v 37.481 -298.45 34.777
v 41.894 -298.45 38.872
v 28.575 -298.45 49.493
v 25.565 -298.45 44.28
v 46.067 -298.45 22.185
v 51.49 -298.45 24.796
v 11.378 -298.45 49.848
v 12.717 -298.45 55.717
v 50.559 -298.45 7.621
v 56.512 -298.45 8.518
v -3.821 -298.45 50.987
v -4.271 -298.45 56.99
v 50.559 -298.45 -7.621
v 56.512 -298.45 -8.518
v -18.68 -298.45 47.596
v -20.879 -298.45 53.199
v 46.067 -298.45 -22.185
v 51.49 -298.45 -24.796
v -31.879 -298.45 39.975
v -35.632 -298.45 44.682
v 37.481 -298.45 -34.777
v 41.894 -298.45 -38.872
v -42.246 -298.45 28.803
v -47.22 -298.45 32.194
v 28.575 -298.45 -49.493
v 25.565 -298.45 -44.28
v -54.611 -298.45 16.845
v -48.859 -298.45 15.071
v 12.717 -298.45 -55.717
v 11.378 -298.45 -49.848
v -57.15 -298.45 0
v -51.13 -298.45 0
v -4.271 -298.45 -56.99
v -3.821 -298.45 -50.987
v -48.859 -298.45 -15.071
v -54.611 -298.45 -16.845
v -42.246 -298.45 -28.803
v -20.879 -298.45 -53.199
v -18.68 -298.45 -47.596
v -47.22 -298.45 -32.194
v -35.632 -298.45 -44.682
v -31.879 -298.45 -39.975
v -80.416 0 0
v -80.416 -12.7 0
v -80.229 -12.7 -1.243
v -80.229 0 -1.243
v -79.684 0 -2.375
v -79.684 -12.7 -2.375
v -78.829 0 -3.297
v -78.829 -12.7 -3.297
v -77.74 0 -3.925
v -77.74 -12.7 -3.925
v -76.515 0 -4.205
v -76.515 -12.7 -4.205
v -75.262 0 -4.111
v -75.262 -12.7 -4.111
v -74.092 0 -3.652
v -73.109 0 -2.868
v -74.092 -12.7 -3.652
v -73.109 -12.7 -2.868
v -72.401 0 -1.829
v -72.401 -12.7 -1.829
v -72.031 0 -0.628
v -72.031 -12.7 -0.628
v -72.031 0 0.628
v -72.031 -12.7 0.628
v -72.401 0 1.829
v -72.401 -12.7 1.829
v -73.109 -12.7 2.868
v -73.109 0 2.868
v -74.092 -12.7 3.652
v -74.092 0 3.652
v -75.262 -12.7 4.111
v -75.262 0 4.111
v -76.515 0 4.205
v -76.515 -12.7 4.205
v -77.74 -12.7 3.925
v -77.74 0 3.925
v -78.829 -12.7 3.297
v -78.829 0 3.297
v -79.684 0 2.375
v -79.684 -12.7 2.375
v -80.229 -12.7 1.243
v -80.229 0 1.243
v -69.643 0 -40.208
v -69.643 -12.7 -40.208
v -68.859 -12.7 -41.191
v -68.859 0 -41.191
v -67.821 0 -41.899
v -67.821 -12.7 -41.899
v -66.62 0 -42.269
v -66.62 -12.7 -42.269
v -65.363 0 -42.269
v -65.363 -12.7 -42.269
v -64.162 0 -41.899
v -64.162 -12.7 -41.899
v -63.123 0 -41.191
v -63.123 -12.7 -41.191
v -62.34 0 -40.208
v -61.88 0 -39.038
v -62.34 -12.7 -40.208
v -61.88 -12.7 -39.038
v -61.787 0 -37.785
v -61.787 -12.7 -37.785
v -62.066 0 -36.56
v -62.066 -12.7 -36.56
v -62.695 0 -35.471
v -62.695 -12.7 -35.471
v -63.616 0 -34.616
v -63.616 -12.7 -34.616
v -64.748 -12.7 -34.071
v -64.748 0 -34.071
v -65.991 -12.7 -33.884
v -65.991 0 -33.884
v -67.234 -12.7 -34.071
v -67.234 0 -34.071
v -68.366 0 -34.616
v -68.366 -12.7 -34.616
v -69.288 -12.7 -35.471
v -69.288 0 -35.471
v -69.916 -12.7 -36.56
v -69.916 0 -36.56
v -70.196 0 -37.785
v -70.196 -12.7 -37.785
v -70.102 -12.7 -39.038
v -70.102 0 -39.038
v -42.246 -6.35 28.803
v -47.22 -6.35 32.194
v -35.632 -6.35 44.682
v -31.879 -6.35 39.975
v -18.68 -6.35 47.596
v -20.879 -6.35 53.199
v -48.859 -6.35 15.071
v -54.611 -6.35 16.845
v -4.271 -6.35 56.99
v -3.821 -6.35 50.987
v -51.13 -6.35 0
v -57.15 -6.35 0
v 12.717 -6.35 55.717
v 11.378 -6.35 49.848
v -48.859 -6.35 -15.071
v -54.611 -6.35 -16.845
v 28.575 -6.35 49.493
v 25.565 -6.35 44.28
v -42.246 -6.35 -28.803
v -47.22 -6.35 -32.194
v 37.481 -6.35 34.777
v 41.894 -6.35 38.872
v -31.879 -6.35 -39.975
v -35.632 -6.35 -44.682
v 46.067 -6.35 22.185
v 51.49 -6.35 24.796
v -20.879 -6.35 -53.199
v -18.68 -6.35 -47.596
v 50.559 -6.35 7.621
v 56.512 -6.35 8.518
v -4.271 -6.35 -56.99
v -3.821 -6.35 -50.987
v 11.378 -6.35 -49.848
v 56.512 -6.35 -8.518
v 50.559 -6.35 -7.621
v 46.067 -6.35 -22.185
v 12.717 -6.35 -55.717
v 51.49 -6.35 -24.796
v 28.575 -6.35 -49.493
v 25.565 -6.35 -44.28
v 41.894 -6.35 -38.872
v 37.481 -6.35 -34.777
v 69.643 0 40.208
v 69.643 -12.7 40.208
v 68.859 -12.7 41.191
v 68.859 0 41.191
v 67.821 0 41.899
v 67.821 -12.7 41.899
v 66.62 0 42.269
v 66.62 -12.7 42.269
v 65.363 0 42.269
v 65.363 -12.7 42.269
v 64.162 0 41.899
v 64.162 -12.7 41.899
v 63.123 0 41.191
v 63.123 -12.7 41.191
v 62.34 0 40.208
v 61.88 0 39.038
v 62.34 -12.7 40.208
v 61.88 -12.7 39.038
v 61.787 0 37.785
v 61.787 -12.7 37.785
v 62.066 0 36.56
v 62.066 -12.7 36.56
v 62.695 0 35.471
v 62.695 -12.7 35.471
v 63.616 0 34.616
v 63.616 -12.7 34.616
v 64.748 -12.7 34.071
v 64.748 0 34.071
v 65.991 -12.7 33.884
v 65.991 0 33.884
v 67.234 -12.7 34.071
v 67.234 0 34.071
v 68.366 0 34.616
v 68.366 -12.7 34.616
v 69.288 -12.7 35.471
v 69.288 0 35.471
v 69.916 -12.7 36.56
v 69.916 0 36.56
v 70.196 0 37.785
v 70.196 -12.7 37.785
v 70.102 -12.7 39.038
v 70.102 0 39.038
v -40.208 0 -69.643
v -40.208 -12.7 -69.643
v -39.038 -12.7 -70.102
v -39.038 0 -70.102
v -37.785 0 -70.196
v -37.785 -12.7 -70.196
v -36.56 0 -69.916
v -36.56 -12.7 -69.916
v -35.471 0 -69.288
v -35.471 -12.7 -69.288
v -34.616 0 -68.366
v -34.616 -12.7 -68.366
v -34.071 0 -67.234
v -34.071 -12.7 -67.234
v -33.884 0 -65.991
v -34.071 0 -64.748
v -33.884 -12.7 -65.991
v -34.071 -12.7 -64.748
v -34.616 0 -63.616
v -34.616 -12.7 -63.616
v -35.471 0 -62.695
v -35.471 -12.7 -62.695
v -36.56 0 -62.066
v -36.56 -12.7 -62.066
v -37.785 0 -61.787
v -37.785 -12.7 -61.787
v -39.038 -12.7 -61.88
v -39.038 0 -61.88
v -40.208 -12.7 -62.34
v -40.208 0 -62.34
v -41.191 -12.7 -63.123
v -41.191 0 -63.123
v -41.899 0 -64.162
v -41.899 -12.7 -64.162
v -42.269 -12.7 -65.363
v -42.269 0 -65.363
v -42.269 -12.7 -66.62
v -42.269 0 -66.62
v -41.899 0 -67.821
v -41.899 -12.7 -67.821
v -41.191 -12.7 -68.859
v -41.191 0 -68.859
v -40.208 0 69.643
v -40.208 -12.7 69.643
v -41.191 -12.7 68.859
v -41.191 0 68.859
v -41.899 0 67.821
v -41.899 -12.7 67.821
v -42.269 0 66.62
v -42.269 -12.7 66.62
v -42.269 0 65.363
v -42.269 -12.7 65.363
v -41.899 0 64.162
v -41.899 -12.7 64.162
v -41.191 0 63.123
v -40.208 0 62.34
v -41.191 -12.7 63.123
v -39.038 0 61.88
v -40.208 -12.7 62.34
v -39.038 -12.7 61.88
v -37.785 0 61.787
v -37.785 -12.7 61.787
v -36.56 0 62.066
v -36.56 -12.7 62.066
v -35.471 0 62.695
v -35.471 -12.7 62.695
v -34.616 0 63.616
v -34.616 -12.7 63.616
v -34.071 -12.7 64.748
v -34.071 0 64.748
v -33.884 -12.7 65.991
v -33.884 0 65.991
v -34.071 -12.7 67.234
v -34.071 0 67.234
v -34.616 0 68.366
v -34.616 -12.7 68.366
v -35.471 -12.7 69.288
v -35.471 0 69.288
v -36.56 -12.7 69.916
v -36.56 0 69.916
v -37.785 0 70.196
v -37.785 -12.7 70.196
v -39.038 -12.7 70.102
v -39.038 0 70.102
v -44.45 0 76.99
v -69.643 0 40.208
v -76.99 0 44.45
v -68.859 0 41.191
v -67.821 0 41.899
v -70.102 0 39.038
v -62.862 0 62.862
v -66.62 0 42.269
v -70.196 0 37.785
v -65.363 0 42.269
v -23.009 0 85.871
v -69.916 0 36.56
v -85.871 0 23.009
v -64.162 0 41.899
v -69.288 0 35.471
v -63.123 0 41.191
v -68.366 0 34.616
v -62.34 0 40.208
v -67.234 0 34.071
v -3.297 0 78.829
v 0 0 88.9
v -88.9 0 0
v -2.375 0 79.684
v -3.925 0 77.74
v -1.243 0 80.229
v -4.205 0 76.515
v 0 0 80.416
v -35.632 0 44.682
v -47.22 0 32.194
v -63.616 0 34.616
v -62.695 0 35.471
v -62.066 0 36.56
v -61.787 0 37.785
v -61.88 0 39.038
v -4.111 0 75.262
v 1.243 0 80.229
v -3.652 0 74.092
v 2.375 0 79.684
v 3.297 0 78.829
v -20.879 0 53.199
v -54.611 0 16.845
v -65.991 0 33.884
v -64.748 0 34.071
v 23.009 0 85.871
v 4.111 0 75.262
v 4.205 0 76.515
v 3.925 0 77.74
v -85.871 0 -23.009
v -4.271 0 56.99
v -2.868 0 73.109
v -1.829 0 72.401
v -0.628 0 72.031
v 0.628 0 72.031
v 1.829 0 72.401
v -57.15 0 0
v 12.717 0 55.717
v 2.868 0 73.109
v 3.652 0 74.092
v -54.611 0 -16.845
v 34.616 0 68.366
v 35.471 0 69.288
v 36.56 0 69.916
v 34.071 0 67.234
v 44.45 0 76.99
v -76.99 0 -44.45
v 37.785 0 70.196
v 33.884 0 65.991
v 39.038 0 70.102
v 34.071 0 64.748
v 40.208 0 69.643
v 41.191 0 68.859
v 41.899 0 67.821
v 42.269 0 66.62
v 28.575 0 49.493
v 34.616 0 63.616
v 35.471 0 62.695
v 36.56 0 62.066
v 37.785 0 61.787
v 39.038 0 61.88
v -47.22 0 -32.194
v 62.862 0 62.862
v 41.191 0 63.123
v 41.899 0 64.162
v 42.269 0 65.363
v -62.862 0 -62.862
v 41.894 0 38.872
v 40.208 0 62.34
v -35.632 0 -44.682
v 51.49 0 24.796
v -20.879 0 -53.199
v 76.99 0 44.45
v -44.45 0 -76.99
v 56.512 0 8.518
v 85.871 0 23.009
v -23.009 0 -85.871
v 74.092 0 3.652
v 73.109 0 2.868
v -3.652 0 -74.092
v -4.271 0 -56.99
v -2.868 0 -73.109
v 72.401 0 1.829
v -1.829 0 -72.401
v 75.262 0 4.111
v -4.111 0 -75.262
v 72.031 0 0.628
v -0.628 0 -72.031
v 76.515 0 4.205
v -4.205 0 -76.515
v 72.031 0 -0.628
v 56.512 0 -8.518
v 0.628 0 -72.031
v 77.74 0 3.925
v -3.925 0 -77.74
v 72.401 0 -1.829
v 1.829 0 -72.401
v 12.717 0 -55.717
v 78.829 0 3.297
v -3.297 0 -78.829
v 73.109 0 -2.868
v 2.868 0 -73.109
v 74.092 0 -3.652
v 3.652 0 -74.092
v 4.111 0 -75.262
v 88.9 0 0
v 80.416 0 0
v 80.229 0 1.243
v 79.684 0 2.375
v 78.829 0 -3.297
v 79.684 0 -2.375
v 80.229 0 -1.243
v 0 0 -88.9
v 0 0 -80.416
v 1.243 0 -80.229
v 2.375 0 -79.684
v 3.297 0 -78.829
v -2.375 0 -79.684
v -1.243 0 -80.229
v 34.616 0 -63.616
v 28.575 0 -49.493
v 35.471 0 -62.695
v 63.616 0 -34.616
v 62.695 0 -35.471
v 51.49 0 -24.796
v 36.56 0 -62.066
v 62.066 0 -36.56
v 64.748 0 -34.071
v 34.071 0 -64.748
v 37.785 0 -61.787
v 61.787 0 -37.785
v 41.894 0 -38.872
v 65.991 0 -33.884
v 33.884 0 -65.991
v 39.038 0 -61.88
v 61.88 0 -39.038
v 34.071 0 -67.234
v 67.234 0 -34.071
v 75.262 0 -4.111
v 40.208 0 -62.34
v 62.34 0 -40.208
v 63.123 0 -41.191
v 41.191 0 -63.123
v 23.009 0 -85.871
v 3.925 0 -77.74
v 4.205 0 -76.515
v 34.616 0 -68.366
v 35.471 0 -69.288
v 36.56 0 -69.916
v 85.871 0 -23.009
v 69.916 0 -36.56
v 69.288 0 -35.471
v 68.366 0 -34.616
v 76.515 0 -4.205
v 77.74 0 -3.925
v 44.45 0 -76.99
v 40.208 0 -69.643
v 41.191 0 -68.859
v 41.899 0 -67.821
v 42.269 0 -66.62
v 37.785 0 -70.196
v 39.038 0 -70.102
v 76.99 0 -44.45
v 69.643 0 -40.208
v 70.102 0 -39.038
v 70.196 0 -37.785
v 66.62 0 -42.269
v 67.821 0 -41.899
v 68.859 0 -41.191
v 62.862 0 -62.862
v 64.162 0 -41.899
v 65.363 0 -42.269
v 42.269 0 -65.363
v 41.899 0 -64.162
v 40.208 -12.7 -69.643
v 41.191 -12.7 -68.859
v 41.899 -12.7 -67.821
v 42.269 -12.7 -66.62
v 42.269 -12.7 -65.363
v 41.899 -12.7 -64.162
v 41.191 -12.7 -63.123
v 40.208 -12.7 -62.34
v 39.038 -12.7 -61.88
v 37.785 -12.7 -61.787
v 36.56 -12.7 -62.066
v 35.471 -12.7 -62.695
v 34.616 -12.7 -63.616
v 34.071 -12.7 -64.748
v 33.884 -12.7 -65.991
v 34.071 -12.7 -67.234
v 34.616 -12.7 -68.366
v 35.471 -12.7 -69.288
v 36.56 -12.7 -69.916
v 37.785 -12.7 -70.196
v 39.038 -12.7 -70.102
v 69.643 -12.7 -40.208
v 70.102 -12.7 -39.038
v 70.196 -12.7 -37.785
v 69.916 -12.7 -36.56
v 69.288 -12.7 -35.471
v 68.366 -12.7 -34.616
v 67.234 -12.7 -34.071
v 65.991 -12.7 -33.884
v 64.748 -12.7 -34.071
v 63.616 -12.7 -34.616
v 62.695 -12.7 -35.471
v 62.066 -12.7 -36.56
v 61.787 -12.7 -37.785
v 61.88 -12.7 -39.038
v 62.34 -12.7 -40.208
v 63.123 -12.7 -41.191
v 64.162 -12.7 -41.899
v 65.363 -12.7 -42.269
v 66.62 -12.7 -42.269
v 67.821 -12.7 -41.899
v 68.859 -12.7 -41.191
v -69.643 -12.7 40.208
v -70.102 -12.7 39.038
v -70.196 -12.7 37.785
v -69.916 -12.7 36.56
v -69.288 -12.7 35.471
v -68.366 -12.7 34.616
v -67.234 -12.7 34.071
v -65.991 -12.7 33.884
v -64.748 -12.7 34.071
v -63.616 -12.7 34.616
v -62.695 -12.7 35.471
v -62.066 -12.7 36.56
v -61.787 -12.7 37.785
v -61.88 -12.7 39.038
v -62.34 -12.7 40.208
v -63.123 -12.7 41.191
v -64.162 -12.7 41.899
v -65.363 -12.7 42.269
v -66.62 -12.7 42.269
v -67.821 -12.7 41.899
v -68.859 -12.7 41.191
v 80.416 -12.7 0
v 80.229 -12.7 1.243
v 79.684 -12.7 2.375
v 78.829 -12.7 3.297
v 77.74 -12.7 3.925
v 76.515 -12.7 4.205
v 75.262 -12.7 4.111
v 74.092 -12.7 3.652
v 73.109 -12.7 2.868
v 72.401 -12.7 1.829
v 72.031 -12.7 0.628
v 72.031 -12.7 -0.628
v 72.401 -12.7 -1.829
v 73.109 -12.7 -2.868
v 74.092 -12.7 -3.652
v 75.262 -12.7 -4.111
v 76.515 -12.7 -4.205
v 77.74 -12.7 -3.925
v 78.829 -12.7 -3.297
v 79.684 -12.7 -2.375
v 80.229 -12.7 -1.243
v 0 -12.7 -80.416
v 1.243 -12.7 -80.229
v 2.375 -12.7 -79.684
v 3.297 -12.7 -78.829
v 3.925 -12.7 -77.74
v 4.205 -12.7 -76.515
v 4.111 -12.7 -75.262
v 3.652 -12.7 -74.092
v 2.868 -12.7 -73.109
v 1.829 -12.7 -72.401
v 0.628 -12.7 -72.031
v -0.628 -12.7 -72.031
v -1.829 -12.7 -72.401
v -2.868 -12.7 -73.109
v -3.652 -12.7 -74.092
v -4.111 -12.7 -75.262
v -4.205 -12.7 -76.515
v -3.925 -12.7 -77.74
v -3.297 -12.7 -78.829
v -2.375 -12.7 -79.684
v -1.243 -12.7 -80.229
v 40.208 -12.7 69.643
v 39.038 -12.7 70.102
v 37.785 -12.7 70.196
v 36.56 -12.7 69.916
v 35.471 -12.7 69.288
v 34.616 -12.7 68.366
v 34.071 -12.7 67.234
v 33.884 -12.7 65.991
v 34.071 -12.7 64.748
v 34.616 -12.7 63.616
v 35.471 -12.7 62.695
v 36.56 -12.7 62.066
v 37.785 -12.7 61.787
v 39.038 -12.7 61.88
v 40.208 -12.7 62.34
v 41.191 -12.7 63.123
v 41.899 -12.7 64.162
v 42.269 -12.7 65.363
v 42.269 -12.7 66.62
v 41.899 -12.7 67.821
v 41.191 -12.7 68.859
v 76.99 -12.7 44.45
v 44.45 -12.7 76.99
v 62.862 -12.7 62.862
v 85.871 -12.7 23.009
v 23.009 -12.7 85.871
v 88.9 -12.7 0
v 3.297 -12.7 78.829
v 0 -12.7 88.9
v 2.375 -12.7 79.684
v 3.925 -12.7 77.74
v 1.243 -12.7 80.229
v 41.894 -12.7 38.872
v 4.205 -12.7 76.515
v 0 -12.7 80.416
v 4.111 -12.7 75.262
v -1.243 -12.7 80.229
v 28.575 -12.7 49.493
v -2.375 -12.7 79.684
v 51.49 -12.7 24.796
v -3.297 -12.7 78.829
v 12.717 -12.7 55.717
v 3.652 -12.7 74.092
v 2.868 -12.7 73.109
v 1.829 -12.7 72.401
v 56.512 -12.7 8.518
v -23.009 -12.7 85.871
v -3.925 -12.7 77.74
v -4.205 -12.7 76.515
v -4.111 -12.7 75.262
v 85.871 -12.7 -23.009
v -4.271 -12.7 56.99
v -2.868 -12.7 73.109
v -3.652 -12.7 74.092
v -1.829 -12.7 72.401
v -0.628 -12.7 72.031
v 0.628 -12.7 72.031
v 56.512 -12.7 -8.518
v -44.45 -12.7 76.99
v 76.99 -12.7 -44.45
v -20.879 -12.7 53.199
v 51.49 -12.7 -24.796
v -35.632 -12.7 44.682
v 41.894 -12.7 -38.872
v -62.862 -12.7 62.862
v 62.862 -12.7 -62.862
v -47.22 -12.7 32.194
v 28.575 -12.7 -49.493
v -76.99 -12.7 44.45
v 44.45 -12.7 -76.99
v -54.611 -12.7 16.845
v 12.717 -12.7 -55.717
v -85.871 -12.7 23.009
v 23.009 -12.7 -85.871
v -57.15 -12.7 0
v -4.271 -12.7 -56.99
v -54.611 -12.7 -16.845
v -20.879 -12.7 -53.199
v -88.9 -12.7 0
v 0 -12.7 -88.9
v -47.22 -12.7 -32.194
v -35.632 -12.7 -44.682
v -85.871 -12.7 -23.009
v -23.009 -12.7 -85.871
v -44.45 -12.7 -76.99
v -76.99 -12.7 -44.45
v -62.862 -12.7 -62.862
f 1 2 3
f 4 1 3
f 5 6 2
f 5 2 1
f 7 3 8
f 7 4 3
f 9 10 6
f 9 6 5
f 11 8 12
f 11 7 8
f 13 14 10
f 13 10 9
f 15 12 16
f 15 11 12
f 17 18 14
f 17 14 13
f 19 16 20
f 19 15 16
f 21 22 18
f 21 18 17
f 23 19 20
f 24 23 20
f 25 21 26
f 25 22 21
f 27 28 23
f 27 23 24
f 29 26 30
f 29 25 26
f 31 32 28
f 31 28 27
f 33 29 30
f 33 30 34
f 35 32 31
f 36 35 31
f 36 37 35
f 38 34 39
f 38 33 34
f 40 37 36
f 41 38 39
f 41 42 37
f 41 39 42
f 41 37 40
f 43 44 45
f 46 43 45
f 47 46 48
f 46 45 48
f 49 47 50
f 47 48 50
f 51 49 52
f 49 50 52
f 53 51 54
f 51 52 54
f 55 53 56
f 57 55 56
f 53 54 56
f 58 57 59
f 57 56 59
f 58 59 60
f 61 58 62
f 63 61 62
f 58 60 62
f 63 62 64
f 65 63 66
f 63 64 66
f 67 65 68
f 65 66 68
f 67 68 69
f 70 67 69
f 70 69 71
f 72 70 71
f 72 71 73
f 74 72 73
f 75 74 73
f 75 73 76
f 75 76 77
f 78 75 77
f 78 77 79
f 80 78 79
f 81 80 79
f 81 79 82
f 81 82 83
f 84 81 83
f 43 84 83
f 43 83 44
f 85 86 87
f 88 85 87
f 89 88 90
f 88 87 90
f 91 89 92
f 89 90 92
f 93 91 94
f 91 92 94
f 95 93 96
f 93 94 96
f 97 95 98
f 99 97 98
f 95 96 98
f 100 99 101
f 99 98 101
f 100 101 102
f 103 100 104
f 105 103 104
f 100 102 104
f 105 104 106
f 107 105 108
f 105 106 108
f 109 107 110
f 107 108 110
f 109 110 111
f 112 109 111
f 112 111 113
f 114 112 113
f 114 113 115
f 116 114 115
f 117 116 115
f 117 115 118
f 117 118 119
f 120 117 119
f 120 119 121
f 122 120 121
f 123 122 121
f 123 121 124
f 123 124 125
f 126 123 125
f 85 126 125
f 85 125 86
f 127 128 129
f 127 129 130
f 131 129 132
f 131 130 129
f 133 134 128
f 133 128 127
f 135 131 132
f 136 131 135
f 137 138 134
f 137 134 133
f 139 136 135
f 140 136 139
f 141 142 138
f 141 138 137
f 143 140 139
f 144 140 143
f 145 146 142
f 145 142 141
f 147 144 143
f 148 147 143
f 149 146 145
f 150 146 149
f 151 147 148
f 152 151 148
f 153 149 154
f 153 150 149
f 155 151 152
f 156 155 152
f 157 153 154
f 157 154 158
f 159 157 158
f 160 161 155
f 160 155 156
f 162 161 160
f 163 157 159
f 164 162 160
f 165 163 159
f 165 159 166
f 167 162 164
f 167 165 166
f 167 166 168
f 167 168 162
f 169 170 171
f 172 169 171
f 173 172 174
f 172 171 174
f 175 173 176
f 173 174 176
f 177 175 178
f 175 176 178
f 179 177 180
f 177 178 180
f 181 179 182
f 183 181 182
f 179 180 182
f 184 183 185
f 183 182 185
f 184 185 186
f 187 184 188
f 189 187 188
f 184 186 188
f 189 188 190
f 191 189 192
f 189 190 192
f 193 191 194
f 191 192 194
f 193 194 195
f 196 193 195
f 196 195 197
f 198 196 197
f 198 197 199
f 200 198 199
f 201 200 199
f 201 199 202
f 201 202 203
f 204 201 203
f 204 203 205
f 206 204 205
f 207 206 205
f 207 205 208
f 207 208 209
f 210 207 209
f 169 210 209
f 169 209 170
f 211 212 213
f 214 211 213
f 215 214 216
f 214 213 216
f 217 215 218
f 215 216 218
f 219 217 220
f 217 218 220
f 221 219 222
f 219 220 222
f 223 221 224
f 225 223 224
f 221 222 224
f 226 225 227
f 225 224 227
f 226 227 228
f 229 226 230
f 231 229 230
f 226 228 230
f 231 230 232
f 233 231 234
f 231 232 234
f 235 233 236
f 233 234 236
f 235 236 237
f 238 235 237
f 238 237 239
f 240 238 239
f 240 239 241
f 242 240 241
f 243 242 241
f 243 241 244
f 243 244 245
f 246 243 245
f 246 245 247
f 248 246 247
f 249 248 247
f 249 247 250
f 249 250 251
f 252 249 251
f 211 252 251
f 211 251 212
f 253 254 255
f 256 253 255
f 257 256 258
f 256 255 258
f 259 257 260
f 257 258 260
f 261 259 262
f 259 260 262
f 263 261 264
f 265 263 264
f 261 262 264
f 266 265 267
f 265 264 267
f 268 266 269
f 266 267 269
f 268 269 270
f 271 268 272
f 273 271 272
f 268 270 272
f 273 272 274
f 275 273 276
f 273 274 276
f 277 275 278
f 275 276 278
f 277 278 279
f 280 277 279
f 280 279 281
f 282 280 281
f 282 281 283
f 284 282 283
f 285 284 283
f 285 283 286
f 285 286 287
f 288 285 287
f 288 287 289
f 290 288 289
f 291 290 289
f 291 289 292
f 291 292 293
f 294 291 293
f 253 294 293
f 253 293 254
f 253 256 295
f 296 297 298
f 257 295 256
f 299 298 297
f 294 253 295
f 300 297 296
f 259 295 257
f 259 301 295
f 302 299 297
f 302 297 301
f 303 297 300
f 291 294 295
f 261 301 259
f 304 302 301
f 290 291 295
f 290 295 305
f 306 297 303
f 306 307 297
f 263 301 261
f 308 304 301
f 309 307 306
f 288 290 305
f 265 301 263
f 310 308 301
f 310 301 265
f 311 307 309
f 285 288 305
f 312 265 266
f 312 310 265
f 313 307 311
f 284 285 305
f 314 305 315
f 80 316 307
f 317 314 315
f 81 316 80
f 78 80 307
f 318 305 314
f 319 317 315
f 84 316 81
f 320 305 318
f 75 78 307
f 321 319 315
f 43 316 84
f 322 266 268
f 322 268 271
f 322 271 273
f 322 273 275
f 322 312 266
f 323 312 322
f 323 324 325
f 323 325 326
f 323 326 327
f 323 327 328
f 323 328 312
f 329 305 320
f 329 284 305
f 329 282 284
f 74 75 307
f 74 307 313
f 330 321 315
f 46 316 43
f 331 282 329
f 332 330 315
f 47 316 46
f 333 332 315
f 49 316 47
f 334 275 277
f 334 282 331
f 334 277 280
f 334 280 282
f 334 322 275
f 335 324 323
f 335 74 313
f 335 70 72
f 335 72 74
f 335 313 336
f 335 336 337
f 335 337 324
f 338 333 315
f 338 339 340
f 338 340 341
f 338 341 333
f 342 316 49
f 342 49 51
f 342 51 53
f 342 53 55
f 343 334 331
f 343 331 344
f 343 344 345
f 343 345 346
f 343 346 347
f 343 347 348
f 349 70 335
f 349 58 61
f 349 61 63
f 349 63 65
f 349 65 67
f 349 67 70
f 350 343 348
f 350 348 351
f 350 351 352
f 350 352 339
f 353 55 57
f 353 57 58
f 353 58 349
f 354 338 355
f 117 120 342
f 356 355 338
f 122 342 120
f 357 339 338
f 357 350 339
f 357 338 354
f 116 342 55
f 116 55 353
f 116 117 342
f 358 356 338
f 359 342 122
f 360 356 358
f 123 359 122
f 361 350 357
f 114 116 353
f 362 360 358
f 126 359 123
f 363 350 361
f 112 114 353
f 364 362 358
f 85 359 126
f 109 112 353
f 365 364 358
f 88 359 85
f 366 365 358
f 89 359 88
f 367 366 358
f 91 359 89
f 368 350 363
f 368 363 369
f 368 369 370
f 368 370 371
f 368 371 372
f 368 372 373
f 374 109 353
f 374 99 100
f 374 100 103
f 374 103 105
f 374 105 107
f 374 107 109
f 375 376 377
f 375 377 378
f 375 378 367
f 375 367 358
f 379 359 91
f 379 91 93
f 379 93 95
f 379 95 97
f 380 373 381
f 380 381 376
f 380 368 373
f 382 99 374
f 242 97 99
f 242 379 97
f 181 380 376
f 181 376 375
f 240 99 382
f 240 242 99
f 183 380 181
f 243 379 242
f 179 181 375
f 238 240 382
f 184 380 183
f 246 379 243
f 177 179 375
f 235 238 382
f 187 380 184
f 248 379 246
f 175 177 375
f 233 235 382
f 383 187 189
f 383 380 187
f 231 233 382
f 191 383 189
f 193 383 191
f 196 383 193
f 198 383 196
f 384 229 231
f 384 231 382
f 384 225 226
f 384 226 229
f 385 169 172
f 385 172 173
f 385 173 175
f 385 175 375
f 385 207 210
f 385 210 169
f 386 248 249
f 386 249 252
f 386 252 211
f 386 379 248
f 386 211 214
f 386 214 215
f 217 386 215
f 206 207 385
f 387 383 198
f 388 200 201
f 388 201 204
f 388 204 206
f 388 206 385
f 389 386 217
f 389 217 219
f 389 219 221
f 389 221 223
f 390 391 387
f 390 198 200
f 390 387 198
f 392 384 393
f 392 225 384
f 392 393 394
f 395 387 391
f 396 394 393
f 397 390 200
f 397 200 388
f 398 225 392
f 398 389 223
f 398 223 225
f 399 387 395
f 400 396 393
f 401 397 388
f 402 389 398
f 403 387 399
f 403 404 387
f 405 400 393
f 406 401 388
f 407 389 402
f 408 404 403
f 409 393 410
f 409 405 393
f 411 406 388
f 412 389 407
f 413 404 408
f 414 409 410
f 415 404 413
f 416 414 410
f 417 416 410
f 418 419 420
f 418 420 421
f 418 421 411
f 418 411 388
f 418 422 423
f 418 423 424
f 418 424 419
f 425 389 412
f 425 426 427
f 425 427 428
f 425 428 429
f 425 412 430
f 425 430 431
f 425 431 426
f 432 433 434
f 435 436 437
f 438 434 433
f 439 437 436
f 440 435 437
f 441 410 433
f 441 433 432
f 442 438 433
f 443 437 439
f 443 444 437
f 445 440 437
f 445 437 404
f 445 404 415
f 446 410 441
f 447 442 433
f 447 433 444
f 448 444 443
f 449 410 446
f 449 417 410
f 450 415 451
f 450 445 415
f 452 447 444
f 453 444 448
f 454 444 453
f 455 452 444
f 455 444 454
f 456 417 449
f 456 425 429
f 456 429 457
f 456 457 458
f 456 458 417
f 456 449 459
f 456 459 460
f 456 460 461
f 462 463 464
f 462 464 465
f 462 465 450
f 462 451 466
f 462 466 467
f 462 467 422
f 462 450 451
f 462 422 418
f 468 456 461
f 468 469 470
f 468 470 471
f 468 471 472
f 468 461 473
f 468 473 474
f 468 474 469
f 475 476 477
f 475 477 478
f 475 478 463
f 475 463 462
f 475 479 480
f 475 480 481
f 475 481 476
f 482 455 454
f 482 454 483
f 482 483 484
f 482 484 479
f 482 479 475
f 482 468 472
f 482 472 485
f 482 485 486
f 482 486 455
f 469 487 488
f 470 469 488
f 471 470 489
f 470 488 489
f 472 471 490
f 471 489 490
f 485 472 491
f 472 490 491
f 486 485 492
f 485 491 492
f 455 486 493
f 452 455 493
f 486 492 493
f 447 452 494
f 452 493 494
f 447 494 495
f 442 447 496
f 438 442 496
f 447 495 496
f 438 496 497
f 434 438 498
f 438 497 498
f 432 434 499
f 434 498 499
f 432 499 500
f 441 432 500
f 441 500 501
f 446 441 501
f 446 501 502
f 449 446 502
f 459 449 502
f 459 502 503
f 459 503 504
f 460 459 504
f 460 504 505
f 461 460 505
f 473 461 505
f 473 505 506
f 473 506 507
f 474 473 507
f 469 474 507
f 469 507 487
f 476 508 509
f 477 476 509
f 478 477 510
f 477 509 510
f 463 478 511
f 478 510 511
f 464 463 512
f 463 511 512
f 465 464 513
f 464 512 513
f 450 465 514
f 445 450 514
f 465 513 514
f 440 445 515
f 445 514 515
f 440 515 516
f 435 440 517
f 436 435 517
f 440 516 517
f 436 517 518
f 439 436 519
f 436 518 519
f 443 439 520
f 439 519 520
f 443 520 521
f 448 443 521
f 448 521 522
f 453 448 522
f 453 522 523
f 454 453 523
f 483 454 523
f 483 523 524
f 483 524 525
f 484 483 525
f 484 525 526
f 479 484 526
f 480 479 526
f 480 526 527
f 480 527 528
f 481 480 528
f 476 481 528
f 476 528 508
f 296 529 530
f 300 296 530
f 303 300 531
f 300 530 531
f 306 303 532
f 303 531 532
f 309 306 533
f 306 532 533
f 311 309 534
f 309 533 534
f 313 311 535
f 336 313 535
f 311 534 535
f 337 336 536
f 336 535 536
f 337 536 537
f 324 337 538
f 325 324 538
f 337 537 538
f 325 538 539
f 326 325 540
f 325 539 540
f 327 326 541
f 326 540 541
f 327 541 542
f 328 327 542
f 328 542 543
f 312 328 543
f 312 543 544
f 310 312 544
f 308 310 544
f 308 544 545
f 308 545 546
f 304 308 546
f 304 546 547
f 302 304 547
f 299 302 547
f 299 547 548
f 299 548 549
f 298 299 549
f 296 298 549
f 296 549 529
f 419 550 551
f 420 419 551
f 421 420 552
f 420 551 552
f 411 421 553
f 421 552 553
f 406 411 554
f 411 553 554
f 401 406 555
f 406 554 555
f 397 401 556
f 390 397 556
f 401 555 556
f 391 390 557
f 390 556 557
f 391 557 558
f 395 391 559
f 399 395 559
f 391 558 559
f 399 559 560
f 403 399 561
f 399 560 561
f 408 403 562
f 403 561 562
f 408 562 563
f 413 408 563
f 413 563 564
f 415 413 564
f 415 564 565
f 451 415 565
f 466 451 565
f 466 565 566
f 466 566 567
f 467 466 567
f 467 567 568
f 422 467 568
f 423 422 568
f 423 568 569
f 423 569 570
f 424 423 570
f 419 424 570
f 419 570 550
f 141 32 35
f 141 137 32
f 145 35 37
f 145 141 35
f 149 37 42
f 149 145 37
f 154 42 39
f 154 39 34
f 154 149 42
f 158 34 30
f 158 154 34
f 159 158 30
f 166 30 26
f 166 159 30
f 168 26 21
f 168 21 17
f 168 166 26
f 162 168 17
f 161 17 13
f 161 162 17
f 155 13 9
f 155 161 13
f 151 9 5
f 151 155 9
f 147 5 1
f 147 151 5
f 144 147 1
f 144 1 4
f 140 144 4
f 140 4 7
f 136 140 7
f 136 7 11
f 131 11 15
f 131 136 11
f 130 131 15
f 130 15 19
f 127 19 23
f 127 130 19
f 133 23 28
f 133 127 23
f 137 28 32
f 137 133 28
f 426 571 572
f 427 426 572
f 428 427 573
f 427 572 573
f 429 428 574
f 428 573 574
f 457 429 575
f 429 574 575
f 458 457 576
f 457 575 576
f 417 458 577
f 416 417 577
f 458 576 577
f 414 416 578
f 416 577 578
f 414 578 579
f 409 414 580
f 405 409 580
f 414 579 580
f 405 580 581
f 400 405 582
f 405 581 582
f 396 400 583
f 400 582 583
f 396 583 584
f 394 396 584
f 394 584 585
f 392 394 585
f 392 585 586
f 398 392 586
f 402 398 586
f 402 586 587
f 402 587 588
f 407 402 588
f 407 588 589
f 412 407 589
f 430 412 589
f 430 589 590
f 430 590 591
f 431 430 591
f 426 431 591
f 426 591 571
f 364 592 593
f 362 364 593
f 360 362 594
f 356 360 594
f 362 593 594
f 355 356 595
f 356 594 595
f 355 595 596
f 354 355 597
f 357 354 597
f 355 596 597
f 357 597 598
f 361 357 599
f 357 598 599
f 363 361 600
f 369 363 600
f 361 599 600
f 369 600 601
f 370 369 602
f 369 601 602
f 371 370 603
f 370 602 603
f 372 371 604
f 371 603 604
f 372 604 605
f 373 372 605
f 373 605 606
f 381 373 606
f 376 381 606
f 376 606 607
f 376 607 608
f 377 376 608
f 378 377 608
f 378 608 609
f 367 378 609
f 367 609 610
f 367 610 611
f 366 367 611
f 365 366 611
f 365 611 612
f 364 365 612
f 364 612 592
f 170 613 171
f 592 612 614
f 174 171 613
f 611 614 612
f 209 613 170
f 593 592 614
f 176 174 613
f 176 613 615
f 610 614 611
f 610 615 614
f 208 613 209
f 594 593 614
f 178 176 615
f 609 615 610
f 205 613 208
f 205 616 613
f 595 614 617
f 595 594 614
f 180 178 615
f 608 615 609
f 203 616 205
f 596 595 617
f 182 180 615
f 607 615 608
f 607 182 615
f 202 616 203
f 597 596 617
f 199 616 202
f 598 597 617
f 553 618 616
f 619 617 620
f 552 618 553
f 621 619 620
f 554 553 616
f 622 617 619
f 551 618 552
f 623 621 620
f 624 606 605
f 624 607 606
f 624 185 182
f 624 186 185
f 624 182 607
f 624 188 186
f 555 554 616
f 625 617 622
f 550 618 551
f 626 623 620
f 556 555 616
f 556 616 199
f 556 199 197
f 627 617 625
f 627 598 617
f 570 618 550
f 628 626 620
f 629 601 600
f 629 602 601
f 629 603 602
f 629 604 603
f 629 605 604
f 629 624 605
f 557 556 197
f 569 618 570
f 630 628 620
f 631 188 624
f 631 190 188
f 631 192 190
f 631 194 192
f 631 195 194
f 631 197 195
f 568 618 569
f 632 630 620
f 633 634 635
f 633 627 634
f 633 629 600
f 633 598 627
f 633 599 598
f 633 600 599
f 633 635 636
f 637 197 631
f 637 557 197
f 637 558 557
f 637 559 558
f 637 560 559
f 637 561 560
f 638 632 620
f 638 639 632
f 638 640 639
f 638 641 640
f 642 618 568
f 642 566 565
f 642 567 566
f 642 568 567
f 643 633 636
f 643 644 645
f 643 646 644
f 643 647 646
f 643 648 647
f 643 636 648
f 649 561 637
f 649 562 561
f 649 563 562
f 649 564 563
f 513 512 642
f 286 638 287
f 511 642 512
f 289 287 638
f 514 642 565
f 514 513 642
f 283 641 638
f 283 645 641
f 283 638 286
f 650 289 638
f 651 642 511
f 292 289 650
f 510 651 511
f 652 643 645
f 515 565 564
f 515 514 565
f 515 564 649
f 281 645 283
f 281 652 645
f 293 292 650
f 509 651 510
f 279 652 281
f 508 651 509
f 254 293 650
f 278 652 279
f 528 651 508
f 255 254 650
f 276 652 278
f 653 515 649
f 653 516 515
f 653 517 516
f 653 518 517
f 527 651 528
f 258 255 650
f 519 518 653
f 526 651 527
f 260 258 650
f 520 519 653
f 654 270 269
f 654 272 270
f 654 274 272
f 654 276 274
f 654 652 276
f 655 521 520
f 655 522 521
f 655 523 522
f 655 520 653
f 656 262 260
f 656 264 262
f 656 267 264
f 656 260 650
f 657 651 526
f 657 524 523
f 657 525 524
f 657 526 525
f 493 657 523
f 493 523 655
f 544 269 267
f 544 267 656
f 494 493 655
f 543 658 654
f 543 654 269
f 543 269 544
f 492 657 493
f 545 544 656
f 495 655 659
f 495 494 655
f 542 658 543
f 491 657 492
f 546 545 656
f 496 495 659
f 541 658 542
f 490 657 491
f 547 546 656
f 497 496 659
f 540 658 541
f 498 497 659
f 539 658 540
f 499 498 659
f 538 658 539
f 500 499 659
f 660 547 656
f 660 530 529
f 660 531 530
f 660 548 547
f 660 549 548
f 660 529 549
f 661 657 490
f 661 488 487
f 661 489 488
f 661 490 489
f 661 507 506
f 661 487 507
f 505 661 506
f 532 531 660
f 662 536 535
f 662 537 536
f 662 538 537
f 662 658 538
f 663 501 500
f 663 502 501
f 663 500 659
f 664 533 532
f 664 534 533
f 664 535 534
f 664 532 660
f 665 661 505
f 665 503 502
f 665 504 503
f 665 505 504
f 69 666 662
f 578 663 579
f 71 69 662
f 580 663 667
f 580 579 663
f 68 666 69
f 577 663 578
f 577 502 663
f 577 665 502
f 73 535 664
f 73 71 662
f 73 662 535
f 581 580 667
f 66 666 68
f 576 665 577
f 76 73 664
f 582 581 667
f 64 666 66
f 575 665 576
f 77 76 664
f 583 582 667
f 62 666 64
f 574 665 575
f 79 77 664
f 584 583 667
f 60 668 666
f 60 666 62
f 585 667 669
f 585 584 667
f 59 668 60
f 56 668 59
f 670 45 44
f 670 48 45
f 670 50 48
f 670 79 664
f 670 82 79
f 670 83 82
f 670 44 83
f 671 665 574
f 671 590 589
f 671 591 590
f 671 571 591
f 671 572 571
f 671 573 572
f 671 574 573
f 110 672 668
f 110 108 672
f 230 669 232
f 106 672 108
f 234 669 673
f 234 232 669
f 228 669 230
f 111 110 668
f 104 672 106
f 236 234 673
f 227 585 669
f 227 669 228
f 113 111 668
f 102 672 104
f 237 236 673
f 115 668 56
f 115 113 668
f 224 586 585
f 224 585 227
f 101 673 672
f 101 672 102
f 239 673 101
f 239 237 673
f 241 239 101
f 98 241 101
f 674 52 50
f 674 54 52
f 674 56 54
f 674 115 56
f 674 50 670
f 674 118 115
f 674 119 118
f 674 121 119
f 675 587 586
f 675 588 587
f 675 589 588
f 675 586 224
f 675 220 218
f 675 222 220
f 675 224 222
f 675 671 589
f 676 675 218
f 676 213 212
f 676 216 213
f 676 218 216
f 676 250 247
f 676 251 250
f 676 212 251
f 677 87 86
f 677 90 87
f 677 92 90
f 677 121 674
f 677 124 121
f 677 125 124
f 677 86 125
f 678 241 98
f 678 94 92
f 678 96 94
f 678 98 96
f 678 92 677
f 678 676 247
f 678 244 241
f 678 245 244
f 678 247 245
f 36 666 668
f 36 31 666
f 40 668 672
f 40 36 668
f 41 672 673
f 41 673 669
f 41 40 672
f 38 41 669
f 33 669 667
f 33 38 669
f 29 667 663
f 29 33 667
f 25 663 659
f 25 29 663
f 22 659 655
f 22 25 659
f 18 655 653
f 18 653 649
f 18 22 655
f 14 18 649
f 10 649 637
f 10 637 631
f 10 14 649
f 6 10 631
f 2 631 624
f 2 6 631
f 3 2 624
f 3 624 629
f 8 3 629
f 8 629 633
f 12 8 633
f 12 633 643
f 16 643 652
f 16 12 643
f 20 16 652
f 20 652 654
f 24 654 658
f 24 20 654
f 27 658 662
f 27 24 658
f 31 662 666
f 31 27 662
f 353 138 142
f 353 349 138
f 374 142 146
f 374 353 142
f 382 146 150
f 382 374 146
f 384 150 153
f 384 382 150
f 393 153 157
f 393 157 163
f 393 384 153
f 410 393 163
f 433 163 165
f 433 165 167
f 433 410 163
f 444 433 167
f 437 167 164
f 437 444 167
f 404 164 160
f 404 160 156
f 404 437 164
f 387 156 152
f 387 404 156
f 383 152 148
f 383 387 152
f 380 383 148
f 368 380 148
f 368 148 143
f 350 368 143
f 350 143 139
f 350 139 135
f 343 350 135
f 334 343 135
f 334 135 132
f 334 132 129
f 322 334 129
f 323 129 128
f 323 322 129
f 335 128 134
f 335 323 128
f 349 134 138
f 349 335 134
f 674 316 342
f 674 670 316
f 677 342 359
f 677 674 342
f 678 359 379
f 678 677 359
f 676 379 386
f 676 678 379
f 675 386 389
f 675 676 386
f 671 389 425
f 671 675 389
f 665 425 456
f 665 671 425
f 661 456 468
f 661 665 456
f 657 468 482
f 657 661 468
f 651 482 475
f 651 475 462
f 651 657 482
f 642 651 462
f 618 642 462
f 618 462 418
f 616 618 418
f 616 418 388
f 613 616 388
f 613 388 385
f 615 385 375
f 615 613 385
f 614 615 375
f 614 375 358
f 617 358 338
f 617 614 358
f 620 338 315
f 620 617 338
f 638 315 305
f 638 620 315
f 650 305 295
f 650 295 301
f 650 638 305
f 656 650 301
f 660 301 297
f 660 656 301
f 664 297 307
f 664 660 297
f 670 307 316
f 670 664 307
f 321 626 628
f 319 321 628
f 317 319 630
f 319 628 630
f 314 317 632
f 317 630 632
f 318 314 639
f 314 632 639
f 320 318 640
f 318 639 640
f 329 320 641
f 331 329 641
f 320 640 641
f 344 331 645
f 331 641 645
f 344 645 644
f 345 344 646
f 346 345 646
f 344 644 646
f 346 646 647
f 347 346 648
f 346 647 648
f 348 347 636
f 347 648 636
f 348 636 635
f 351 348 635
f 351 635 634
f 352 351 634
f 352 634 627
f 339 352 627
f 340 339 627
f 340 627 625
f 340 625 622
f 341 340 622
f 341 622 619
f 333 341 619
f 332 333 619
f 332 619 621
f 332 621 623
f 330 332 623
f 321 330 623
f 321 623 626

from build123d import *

# Parameters (mm, degrees)
F_5_16_CLEARANCE_HOLE1_D = 8.4328
CIRPATTERN1_COUNT        = 12


with BuildPart() as part:
    # Sketch1 → Revolve1 (revolve)
    with BuildSketch(Plane.XY):
        Polygon((-57.15, 0), (-88.9, 0), (-88.9, -12.7), (-57.15, -12.7), (-57.15, -298.45), (-51.1302, -298.45), (-51.1302, -6.35), (-57.15, -6.35), align=None)
    revolve(axis=Axis((0, 0, 0), (0, -1, 0)))

    # 5/16 Clearance Hole1 (through all)
    with Locations(Plane(origin=(0, 0, 0), x_dir=(1, 0, 0), z_dir=(0, 1, 0))):
        with Locations((-76.2, 0)):
            f_5_16_clearance_hole1 = Hole(F_5_16_CLEARANCE_HOLE1_D / 2)

    # CirPattern1: 5/16 Clearance Hole1 ×12 about axis
    cirpattern1_axis = Axis((0, 0, 0), (0, 1, 0))
    for i in range(1, CIRPATTERN1_COUNT):
        add(f_5_16_clearance_hole1.rotate(cirpattern1_axis, i * 360 / CIRPATTERN1_COUNT), mode=Mode.SUBTRACT)


solid = part.part
